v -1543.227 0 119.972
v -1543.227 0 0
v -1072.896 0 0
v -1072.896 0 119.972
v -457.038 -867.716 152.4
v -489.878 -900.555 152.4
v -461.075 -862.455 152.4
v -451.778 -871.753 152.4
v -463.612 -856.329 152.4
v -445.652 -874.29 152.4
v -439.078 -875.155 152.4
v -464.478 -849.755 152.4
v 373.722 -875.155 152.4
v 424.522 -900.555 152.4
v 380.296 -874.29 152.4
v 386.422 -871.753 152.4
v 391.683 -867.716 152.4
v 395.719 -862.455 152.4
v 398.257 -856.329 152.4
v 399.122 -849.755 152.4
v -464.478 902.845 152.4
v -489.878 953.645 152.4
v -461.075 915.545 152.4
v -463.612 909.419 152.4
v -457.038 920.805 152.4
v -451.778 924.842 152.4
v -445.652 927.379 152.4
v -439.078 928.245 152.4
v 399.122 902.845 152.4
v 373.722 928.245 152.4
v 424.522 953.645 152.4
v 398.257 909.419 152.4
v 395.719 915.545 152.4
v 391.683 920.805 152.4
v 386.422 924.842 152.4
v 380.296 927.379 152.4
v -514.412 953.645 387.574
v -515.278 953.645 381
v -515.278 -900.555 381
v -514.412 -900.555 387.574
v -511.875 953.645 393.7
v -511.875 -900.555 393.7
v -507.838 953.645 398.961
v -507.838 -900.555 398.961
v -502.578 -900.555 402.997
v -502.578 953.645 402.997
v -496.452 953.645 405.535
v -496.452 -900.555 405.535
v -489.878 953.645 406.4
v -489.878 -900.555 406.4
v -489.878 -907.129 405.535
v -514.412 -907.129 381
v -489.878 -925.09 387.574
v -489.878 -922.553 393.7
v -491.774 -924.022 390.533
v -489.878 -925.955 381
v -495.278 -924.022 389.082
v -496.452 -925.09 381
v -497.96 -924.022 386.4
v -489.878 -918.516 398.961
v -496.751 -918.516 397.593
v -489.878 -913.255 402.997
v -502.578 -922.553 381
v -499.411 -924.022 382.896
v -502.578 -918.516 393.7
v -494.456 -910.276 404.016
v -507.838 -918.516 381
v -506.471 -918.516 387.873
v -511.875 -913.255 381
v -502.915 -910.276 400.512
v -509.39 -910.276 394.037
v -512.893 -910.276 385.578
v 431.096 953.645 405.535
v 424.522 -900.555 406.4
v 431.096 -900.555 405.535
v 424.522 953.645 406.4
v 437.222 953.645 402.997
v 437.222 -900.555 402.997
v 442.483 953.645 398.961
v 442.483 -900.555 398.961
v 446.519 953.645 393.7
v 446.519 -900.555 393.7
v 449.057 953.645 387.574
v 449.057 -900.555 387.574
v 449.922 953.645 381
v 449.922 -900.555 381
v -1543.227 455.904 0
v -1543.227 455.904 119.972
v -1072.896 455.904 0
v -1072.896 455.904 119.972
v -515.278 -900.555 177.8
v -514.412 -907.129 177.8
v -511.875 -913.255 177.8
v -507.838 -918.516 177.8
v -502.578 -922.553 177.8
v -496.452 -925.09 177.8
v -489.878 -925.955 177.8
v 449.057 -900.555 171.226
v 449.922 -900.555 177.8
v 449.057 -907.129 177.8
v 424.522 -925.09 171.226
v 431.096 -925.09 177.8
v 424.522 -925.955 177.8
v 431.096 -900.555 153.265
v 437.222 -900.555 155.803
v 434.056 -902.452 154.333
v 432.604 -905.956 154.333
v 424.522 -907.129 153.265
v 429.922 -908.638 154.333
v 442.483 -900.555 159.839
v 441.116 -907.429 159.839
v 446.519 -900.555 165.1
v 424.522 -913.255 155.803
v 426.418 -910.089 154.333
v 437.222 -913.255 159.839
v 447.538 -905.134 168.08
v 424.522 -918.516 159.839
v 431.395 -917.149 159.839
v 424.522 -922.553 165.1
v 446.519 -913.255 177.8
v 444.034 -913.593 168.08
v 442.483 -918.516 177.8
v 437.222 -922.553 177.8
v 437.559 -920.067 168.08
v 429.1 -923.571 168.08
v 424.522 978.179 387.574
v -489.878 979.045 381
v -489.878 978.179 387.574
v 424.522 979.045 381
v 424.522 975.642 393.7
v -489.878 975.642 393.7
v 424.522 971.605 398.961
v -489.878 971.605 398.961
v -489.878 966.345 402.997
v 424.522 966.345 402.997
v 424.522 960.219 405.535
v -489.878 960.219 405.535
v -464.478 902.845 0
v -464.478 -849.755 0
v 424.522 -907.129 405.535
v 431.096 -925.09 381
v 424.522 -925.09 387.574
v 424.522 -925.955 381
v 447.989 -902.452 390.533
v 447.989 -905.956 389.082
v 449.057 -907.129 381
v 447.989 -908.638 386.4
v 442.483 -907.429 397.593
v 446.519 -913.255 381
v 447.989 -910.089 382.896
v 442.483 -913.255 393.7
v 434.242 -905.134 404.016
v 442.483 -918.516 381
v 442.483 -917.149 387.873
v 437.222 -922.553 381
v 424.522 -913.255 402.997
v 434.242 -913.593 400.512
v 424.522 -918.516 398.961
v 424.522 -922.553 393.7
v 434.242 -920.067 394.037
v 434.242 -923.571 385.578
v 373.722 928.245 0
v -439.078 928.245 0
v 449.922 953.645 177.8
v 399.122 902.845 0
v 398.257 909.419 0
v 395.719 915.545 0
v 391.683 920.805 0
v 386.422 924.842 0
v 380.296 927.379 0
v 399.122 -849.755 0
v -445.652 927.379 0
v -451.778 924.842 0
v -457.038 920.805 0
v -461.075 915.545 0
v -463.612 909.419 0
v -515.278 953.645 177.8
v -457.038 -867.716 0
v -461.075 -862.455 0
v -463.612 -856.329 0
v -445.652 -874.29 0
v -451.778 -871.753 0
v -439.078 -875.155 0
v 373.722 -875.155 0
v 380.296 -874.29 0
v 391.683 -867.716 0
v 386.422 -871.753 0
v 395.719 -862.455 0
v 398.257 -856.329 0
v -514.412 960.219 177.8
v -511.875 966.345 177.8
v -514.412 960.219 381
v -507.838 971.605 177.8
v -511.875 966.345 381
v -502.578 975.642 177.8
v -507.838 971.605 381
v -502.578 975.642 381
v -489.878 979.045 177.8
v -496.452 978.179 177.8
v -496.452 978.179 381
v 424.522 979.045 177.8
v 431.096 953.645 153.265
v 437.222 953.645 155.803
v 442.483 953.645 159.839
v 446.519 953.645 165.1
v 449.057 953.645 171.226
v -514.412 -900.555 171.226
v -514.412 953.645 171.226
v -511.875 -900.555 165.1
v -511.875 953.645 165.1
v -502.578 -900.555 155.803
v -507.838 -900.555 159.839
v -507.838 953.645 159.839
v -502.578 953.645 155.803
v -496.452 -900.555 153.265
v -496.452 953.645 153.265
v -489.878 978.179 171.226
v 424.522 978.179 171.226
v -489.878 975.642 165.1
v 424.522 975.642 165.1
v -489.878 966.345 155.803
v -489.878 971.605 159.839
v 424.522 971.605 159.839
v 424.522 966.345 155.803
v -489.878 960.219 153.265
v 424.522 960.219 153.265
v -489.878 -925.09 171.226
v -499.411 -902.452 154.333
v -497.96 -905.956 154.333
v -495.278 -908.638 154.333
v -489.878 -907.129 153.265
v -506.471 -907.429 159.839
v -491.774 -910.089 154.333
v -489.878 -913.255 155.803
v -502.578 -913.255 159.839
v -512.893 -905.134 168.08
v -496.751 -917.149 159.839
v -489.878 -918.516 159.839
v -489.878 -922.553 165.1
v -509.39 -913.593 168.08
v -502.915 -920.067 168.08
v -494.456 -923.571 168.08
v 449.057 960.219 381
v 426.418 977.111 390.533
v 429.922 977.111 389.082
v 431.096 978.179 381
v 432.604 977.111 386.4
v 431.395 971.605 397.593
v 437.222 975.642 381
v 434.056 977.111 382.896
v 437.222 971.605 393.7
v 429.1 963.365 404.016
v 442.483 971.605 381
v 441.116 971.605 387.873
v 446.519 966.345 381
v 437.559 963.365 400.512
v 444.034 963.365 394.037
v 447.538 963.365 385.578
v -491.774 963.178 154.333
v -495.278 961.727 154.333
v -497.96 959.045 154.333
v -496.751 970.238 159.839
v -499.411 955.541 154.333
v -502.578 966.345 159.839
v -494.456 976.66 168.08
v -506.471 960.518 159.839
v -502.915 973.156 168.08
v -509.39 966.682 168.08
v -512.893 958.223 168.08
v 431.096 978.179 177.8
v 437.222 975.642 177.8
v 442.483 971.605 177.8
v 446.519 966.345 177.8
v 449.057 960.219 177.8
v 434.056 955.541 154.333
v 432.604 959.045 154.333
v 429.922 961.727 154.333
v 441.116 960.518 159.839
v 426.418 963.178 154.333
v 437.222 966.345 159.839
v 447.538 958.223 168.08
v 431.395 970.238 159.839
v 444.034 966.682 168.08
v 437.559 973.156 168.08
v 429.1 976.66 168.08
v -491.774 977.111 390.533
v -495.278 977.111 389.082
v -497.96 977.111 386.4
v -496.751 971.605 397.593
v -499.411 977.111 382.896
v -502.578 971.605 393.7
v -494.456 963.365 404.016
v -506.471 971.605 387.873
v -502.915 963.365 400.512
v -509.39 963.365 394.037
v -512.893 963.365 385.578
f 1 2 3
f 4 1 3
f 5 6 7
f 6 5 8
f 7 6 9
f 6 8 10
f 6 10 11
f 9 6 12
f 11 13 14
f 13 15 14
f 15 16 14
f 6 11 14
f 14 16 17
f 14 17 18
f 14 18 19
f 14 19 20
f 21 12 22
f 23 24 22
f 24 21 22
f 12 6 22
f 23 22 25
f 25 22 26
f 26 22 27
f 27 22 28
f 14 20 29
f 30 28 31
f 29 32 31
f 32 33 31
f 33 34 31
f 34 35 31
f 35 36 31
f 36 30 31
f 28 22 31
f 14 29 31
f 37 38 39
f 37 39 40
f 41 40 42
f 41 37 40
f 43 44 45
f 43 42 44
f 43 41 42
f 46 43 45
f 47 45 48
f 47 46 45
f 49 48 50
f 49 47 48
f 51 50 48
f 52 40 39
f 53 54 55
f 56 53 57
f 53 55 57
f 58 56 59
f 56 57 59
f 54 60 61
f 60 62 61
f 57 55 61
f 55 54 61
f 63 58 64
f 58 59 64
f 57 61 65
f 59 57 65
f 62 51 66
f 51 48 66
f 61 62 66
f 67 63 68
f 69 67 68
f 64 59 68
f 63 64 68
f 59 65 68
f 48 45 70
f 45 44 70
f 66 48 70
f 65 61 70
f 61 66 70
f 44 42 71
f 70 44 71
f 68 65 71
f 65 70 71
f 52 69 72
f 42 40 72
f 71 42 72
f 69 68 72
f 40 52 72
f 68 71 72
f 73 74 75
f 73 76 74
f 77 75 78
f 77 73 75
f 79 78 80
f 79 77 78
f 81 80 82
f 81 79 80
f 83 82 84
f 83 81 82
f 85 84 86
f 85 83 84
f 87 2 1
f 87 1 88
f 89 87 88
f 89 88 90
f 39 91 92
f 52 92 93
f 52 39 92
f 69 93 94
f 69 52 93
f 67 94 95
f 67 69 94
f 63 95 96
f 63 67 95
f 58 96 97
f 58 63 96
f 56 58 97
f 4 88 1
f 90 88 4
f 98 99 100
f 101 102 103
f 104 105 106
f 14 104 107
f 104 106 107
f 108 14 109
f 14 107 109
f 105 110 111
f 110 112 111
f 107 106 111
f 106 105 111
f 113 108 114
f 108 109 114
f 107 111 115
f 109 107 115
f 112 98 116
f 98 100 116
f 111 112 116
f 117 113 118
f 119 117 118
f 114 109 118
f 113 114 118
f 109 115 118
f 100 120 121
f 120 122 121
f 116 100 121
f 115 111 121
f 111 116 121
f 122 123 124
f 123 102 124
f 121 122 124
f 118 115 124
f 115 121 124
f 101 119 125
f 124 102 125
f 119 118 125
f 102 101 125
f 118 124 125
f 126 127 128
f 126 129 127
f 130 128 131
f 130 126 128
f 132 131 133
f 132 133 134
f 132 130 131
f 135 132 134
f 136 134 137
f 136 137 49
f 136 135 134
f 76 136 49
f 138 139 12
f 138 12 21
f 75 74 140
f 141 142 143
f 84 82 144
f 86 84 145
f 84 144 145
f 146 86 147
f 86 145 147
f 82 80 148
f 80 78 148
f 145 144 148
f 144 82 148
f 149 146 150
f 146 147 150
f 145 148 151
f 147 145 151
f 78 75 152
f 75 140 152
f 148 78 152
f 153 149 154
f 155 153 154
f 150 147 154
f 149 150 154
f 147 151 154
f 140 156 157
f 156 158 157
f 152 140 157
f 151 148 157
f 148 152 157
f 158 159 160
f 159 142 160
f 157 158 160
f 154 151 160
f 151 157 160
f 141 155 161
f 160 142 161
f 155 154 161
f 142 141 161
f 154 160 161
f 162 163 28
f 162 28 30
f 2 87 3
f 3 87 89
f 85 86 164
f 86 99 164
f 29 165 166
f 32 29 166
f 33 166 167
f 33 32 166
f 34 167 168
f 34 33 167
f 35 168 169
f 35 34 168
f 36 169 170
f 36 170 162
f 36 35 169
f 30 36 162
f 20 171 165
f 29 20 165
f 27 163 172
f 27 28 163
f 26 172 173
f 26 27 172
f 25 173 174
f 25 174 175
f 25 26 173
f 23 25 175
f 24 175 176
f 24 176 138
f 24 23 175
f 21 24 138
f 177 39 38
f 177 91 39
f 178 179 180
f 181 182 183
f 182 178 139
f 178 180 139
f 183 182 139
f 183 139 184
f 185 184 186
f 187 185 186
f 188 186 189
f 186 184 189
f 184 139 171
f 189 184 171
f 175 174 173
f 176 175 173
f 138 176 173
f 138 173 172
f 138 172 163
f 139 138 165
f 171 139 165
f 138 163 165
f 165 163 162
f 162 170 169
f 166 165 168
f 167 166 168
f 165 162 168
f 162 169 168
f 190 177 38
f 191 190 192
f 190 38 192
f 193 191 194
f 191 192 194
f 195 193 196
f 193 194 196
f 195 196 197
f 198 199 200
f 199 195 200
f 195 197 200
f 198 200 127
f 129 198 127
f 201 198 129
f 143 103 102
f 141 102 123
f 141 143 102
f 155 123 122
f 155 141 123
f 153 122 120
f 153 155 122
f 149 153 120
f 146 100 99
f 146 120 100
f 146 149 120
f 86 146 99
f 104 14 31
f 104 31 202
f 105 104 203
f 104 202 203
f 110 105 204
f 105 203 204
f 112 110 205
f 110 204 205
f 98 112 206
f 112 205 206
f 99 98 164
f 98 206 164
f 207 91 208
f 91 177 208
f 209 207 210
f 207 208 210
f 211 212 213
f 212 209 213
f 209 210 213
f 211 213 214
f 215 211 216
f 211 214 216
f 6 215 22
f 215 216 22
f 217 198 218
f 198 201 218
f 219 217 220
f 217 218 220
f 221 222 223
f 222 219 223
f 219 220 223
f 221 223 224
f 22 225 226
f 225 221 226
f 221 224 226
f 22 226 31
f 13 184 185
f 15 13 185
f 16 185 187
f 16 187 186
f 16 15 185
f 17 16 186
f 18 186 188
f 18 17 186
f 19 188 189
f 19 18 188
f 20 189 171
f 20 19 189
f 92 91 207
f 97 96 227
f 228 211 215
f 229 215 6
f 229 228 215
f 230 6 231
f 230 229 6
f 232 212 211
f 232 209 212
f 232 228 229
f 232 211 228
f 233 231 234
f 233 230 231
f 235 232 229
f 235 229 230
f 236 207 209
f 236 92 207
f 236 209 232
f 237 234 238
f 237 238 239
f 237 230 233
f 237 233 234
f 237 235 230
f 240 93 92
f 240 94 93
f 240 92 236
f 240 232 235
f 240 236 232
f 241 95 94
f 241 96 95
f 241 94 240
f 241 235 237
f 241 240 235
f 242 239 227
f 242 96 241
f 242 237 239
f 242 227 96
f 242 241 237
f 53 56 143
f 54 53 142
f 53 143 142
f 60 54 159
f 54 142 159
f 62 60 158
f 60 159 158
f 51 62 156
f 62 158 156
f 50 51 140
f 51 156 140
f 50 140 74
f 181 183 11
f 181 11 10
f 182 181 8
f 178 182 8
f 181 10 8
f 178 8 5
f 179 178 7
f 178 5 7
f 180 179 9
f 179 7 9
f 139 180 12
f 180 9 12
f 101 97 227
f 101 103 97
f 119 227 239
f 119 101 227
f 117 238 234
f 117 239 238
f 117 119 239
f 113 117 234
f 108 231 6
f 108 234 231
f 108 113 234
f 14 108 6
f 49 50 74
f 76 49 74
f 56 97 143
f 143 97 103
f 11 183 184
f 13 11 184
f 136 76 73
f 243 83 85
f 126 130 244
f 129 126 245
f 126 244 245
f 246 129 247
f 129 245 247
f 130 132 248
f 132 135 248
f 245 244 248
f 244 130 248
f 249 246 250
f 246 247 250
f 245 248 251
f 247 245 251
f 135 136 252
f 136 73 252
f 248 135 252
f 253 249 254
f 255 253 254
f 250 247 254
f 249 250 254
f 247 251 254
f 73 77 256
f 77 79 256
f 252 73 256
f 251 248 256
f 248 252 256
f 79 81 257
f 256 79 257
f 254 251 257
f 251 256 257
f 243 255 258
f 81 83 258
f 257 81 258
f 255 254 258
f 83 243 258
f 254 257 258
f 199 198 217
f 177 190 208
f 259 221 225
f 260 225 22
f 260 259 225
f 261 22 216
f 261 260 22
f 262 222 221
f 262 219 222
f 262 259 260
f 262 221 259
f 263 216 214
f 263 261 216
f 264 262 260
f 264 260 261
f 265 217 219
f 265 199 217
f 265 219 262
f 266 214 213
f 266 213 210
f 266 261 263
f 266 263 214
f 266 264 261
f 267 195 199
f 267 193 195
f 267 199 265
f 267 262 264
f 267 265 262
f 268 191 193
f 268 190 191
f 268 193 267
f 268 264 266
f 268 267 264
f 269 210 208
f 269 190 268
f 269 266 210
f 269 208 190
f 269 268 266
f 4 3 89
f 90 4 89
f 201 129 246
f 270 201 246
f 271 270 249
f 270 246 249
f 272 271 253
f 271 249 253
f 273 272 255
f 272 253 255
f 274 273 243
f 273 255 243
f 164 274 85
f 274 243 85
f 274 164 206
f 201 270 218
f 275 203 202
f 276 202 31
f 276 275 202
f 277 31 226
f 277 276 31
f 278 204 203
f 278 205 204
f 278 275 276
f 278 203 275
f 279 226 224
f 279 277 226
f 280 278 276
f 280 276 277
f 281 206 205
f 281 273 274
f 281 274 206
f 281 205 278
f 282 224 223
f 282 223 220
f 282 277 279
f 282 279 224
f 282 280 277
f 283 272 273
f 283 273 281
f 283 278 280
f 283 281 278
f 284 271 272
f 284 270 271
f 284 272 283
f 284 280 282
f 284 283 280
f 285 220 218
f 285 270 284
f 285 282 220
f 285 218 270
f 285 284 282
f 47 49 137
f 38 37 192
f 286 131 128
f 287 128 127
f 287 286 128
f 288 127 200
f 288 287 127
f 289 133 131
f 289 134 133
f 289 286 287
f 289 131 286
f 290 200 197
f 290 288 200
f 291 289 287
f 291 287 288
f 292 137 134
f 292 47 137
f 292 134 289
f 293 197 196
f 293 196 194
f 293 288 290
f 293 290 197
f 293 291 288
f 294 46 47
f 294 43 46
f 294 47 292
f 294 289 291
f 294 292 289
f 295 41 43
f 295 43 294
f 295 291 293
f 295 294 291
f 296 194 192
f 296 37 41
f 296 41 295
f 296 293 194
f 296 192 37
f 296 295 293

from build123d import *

# Parameters (mm, degrees)
F0_W     = 863.6
F0_H     = 1803.4
F1_DEPTH = 152.4
F2_W     = 965.2
F2_H     = 1905
F3_DEPTH = 254
F4_R     = 25.4
F5_W     = 470.331192
F5_H     = 455.904096
F6_DEPTH = 119.97156


with BuildPart() as f1:
    # F0 (on Top) → F1 (new body)
    with BuildSketch(Plane.XY):
        with Locations((-32.677825, 26.544513)):
            Rectangle(F0_W, F0_H)
    extrude(amount=F1_DEPTH)

    # F2 (on face) → F3 (join)
    with BuildSketch(Plane.XY.offset(152.4)):
        with Locations((-32.677825, 26.544513)):
            Rectangle(F2_W, F2_H)
    extrude(amount=F3_DEPTH)

    # F4
    f4_edges = [f1.edges().sort_by_distance(p)[0] for p in [
        (-515.277825, 26.544513, 406.4),
        (-32.677825, -925.955487, 406.4),
        (449.922175, 26.544513, 406.4),
        (-32.677825, 979.044513, 406.4),
        (449.922175, -925.955487, 279.4),
        (449.922175, 979.044513, 279.4),
        (449.922175, 26.544513, 152.4),
        (-515.277825, 979.044513, 279.4),
        (-32.677825, 979.044513, 152.4),
        (-515.277825, -925.955487, 279.4),
        (-515.277825, 26.544513, 152.4),
        (-32.677825, -925.955487, 152.4),
        (399.122175, -875.155487, 76.2),
        (399.122175, 928.244513, 76.2),
        (-464.477825, 928.244513, 76.2),
        (-464.477825, -875.155487, 76.2),
    ]]
    fillet(f4_edges, radius=F4_R)


with BuildPart() as f6:
    # F5 (on Top) → F6 (new body)
    with BuildSketch(Plane.XY):
        with Locations((-1308.061242, 227.952048)):
            Rectangle(F5_W, F5_H)
    extrude(amount=F6_DEPTH)


solid = Compound([f1.part, f6.part])
